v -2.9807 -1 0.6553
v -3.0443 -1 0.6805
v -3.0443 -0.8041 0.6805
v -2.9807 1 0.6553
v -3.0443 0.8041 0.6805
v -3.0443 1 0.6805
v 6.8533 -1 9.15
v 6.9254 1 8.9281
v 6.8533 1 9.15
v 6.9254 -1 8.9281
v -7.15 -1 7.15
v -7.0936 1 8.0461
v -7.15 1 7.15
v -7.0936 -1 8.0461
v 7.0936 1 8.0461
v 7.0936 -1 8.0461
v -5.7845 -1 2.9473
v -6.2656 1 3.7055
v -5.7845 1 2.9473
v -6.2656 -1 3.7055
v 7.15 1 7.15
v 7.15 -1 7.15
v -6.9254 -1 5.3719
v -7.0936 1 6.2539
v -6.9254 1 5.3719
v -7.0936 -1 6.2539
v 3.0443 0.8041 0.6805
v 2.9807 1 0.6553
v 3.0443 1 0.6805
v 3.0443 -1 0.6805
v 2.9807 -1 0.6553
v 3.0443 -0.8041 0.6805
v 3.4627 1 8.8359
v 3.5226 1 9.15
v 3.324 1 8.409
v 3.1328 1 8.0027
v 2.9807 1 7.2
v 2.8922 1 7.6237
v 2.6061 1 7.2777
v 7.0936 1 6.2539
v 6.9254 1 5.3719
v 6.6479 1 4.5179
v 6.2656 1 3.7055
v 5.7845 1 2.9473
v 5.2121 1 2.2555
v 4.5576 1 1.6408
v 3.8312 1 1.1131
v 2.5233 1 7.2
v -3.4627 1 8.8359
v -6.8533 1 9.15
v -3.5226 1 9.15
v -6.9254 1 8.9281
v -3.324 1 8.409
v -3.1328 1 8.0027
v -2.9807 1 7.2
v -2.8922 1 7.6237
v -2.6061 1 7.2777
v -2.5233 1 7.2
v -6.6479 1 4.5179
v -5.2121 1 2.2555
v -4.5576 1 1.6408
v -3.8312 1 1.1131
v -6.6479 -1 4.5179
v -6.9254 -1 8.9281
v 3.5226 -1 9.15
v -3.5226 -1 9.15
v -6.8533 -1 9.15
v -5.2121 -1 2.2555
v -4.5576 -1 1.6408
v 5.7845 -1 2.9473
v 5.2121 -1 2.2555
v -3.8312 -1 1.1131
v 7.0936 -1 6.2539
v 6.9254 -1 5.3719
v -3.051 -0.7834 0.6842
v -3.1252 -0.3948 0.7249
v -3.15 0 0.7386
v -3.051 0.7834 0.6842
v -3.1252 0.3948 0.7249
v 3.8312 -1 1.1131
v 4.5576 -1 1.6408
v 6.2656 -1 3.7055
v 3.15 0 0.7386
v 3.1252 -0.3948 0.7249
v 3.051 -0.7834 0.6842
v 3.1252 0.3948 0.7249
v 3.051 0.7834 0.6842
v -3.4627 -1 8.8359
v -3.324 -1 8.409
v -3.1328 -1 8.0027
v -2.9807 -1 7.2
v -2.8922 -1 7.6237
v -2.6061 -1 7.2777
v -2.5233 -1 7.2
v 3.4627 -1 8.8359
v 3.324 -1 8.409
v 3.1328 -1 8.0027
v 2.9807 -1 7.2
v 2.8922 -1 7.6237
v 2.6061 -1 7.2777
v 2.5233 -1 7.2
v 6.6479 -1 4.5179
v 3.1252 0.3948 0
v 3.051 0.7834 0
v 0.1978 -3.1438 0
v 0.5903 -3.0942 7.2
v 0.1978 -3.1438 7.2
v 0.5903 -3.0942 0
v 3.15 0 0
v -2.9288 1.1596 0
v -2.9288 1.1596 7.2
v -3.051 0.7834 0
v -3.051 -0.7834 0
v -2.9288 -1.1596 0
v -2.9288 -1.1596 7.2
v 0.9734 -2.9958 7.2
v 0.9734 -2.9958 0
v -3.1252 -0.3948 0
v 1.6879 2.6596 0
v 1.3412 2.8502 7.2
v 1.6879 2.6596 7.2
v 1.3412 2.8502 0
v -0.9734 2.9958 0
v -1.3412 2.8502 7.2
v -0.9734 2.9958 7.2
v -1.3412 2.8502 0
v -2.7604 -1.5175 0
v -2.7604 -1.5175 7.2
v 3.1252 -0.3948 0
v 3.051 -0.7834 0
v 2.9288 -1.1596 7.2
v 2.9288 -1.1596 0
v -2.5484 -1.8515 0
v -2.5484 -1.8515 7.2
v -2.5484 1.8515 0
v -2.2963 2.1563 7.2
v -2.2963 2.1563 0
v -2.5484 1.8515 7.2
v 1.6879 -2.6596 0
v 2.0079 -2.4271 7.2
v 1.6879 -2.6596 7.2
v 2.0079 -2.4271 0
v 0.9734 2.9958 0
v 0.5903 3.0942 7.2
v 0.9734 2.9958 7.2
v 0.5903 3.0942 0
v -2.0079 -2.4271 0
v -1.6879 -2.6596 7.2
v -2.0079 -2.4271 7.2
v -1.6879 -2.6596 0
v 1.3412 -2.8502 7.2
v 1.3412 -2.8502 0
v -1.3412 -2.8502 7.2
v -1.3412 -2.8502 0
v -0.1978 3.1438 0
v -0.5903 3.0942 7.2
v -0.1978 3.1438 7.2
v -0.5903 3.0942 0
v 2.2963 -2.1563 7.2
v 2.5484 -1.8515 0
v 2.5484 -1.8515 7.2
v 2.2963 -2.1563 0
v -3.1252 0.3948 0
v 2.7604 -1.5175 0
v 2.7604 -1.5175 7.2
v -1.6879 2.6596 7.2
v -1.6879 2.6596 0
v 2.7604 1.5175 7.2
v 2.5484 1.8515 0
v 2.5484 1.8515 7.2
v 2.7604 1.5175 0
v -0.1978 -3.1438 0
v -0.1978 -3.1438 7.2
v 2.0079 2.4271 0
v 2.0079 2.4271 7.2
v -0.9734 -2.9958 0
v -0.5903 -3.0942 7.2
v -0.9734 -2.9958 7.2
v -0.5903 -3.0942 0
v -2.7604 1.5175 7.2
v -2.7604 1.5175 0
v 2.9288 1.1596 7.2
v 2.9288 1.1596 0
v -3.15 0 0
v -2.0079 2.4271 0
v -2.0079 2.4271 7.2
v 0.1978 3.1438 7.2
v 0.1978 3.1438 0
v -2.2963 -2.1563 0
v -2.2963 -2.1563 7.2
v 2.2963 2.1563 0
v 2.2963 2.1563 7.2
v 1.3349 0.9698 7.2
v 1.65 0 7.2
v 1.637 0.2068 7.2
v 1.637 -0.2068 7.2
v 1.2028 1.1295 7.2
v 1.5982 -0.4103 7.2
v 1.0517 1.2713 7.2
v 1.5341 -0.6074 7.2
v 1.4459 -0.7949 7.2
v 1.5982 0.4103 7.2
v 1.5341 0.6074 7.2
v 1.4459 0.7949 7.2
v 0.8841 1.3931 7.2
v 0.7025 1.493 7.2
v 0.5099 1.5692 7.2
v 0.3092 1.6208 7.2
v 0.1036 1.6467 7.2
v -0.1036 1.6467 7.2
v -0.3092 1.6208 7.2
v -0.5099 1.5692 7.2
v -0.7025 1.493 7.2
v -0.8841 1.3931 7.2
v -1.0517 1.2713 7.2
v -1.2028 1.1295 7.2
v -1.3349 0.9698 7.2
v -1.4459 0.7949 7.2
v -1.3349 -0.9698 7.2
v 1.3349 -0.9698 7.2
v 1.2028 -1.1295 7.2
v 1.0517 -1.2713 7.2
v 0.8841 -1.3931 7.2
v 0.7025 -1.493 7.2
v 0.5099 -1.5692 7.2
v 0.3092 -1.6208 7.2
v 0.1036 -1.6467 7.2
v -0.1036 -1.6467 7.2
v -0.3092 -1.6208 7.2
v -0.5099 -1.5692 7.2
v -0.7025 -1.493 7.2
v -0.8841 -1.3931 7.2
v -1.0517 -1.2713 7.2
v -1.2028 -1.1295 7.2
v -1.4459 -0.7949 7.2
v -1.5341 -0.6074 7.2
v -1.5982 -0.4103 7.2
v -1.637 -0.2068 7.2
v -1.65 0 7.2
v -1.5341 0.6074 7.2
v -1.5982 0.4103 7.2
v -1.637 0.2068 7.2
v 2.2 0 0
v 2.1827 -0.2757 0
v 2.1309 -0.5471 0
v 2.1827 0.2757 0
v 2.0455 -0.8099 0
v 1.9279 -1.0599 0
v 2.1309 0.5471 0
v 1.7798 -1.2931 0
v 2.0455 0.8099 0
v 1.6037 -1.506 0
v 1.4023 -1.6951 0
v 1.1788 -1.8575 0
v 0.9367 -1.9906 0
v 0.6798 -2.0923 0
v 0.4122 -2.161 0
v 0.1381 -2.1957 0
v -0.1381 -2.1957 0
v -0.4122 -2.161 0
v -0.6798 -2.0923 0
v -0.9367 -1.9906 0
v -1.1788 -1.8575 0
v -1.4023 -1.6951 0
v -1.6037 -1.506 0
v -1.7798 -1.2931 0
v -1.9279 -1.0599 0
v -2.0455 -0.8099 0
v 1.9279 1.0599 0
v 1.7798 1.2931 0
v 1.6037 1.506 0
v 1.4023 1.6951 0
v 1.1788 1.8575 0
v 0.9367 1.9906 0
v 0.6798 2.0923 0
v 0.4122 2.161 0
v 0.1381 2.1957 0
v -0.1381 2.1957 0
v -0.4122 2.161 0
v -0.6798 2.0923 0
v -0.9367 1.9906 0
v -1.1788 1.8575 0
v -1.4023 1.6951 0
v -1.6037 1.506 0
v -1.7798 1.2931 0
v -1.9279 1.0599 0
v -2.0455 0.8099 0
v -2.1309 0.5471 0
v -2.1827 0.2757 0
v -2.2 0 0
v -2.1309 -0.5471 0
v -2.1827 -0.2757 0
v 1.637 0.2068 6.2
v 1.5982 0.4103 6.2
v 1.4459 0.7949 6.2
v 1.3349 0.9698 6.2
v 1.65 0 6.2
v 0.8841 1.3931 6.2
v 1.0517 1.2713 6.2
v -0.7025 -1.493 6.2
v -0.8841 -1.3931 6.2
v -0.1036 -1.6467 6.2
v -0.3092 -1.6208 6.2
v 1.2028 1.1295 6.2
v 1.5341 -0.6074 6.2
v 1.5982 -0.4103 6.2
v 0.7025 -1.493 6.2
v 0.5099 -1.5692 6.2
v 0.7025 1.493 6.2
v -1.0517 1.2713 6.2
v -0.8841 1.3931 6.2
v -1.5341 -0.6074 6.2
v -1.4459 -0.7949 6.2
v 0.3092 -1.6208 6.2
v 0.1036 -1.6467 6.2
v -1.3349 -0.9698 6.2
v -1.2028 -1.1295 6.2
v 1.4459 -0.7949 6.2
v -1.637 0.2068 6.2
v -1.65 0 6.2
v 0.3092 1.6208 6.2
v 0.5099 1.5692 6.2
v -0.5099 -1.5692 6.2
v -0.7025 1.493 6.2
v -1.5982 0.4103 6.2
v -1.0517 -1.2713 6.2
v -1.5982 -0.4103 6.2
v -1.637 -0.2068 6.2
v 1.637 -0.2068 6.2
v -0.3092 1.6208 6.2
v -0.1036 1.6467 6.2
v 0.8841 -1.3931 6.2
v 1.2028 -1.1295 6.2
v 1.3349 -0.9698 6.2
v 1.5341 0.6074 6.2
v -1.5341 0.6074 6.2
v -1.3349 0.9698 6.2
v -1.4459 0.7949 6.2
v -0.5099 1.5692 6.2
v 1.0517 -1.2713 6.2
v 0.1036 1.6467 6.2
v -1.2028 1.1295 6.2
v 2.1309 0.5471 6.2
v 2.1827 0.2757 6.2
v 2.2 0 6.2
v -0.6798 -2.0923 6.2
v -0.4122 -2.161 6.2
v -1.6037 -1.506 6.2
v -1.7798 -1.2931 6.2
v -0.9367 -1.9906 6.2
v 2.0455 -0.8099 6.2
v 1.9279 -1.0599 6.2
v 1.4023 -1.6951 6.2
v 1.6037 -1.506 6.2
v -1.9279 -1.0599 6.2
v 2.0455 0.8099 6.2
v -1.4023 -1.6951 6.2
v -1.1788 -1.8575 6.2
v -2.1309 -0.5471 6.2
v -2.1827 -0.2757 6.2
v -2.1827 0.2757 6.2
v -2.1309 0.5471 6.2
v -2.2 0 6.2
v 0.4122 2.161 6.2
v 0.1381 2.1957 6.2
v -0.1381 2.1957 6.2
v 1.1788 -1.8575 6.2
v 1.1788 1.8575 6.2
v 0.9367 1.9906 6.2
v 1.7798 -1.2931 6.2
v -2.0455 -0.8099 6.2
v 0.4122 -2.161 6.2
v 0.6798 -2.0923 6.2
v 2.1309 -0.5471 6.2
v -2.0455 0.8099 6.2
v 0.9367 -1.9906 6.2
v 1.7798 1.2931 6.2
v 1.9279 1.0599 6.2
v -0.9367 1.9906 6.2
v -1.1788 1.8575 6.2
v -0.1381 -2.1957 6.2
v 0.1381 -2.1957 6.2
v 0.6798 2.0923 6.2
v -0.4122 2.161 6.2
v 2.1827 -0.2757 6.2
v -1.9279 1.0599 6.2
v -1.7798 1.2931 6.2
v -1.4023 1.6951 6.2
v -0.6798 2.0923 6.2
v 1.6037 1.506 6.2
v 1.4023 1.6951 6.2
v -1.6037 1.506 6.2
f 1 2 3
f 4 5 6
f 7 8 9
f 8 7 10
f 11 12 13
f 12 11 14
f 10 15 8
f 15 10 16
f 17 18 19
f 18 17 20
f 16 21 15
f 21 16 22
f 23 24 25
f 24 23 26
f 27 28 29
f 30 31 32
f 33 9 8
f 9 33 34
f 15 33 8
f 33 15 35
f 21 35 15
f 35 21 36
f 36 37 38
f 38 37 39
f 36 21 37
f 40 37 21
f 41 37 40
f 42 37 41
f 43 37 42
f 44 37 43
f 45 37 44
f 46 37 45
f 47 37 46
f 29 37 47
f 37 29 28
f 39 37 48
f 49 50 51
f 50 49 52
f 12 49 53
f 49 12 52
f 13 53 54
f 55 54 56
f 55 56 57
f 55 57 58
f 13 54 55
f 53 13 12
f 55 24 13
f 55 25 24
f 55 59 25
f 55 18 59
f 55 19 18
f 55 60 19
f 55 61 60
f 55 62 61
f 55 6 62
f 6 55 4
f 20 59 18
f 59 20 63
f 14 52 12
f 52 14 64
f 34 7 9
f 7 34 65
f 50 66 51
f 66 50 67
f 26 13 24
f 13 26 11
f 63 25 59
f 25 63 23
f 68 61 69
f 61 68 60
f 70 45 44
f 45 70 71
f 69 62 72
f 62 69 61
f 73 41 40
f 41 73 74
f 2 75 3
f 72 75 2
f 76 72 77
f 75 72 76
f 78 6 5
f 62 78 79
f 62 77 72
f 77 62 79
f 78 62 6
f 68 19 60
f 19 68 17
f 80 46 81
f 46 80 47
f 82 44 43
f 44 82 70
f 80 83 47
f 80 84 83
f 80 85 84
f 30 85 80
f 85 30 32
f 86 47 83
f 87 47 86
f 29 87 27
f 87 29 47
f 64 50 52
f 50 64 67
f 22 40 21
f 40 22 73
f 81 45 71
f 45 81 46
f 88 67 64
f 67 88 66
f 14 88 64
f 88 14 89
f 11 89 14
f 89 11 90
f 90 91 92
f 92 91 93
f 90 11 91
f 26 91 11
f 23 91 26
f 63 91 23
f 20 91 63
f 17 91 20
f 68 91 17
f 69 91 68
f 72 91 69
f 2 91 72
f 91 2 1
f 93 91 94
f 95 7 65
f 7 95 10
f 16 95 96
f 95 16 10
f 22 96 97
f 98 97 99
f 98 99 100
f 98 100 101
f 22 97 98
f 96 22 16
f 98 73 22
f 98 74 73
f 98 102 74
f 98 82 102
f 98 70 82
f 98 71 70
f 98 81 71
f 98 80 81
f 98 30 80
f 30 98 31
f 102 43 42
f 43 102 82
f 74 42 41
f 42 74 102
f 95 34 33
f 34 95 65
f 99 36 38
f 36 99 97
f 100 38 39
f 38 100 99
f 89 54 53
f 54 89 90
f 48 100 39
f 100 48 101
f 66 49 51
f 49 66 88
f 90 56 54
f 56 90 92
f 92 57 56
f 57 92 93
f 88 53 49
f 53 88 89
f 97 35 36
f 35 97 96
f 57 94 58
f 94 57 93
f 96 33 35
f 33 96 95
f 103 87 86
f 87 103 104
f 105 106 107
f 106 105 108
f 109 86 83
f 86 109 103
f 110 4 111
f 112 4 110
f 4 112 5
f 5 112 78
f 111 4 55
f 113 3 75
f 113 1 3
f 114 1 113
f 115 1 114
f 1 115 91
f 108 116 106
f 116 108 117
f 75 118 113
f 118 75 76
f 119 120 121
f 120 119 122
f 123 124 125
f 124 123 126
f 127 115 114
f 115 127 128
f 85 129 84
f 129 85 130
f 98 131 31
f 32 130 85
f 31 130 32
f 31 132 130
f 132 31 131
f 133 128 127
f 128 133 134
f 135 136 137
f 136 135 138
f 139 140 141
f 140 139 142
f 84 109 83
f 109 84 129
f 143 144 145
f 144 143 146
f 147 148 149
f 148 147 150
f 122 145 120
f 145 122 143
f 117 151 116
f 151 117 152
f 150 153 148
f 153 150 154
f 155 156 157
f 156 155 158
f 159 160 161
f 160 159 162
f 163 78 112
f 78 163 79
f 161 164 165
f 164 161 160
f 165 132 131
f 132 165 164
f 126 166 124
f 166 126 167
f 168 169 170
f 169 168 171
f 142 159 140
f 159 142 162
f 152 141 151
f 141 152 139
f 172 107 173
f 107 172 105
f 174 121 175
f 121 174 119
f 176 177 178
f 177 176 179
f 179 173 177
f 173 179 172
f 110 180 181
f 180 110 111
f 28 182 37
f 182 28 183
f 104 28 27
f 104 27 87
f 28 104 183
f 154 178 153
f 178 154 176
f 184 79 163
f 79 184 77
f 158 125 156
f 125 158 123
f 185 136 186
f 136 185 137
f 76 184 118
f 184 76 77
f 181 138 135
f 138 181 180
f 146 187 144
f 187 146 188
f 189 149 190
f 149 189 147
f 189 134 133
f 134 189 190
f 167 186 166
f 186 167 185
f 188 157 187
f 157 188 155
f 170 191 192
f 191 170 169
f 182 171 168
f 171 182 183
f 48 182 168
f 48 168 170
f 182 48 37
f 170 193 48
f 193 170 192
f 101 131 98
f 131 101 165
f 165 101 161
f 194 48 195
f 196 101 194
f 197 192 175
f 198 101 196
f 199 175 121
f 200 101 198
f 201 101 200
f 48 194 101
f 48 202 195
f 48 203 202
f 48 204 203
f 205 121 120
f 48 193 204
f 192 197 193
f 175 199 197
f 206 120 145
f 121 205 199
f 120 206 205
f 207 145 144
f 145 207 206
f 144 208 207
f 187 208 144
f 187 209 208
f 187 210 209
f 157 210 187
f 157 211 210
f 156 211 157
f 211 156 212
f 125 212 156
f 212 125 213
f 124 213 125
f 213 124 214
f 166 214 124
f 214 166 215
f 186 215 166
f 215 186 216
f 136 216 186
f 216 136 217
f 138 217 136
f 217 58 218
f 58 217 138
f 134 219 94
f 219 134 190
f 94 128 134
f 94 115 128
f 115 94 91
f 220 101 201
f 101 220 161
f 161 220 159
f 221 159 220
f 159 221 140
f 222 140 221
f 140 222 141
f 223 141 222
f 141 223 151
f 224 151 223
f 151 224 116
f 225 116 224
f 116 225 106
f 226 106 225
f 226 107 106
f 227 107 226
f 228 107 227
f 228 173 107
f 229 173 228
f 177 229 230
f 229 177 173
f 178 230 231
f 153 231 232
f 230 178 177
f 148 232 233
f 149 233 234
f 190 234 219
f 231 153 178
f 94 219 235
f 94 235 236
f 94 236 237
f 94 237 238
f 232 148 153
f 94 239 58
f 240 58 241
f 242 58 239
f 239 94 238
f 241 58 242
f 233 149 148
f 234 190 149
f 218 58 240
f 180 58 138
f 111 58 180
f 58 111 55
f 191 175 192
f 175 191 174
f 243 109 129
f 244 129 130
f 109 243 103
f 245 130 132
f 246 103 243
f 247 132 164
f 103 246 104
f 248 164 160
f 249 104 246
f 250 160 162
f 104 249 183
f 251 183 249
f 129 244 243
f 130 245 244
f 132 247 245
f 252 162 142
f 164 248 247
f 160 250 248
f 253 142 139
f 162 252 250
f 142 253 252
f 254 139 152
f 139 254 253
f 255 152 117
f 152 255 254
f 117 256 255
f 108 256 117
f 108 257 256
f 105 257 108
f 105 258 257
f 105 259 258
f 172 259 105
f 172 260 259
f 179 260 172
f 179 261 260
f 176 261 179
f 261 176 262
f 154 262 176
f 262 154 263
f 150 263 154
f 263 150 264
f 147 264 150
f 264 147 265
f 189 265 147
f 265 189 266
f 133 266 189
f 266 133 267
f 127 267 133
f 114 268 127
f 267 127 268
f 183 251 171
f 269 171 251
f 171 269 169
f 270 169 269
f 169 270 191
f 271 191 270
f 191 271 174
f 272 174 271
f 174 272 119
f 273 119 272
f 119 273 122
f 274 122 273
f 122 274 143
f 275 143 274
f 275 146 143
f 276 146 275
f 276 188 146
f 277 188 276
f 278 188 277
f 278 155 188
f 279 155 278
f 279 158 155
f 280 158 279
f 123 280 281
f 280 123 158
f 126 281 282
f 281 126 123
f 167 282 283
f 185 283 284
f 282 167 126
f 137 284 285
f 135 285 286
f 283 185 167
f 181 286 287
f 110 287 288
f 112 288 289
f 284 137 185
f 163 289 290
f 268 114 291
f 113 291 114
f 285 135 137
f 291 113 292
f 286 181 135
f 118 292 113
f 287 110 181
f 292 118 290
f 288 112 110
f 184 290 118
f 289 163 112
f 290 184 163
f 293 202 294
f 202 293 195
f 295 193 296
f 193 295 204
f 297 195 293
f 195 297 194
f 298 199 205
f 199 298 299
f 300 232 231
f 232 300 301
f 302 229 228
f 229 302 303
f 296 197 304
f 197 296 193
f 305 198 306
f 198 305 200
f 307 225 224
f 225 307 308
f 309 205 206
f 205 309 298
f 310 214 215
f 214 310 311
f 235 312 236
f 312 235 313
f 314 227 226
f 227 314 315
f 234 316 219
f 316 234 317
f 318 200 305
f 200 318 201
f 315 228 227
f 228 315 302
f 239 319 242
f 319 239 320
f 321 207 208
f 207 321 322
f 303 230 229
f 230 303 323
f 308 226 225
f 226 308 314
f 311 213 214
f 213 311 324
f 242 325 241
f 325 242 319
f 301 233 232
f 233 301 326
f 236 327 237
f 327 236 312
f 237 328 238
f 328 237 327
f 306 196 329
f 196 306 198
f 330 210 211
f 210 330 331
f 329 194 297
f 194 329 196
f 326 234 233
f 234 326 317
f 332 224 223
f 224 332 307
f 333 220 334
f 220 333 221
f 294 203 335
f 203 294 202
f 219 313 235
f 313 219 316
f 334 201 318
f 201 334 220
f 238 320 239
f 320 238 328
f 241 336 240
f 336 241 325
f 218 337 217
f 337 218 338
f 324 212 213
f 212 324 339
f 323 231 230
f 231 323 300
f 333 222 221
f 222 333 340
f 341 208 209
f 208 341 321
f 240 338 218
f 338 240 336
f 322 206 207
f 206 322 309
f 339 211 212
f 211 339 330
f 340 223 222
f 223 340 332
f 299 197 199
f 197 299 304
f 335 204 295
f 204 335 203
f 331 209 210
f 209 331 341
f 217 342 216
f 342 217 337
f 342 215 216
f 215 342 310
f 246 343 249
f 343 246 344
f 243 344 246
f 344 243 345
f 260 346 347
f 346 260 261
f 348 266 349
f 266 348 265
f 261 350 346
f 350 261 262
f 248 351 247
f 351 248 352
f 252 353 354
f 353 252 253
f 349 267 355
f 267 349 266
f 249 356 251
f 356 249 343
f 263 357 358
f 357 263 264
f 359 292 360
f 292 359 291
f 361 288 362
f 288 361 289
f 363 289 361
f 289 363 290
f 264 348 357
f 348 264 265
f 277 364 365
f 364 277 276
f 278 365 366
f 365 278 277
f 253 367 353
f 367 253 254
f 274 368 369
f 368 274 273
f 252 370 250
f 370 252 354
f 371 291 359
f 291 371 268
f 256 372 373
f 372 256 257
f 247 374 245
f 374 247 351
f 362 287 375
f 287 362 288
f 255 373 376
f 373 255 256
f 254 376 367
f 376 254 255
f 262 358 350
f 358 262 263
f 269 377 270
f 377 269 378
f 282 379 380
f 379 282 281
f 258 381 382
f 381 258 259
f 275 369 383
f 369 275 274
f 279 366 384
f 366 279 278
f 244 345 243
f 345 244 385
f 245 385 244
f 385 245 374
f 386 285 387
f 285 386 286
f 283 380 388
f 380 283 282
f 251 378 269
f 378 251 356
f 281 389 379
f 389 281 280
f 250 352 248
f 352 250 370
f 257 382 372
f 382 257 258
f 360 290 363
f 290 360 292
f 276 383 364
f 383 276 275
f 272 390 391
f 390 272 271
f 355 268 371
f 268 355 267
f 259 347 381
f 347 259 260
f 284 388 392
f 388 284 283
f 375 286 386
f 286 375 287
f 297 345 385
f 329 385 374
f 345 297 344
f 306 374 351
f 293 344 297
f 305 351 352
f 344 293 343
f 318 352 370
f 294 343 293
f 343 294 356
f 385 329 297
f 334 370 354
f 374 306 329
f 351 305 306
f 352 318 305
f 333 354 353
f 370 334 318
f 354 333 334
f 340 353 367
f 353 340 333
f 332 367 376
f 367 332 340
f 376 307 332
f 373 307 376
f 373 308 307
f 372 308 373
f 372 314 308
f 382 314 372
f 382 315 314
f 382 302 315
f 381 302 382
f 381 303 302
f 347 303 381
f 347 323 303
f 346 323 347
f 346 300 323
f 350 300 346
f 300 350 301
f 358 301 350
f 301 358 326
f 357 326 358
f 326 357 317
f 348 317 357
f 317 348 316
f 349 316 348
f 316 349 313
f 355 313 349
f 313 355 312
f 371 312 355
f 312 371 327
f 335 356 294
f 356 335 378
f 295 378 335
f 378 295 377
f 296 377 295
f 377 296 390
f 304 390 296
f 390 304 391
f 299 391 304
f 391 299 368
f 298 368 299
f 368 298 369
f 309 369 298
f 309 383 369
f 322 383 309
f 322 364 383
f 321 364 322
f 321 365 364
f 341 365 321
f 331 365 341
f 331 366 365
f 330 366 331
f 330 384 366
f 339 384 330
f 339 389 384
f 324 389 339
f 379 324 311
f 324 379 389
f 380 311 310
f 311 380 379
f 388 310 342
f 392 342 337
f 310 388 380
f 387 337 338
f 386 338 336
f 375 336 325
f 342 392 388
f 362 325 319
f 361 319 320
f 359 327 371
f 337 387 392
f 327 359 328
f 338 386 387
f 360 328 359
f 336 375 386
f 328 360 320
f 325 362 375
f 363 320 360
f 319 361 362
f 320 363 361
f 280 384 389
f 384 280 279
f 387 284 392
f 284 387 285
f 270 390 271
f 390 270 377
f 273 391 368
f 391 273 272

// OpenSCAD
$fn = 50;
hole_diameter = 3.3;
insert_diameter = 4.6;
insert_height = 5.7;

outer_diameter=hole_diameter + 3;
height = insert_height + 1.5;
fin_width = outer_diameter + 8;
fin_thickness = 2;
fin_offset = 2;

module buffer_extrude(depth, buffer=0.5) {
    translate([0, 0, -buffer]) {
        linear_extrude(depth+buffer*2) {
            children();
        }
    }
}

module screw_hole(x, y, depth, d ) {
    buffer_extrude(depth, 0.5) {
        circle(d=d);
    }
}

module fins() {
    rotate([-90, 0, 0]){
        translate([0, -fin_width / 2, -fin_thickness / 2]){
            difference() {
                linear_extrude(fin_thickness) {
                    difference() {
                        circle(d=fin_width);
                        translate([0, -fin_width / 2 - fin_offset, 0]){
                            square([fin_width, fin_width], true);
                        }
                    }
                }
                translate([0, -(fin_width/4) + 1, 0]) {
                    buffer_extrude(fin_thickness) {
                        circle(d=fin_width/2);
                    }
                }
            }
        }
    }
}



difference() {
    union() {
        linear_extrude(height) {
            circle(d=outer_diameter);
        }
        fins();
    }
    screw_hole(0, 0, height + 10, hole_diameter);
    screw_hole(0, 0, , insert_height, insert_diameter - 0.2);
}
